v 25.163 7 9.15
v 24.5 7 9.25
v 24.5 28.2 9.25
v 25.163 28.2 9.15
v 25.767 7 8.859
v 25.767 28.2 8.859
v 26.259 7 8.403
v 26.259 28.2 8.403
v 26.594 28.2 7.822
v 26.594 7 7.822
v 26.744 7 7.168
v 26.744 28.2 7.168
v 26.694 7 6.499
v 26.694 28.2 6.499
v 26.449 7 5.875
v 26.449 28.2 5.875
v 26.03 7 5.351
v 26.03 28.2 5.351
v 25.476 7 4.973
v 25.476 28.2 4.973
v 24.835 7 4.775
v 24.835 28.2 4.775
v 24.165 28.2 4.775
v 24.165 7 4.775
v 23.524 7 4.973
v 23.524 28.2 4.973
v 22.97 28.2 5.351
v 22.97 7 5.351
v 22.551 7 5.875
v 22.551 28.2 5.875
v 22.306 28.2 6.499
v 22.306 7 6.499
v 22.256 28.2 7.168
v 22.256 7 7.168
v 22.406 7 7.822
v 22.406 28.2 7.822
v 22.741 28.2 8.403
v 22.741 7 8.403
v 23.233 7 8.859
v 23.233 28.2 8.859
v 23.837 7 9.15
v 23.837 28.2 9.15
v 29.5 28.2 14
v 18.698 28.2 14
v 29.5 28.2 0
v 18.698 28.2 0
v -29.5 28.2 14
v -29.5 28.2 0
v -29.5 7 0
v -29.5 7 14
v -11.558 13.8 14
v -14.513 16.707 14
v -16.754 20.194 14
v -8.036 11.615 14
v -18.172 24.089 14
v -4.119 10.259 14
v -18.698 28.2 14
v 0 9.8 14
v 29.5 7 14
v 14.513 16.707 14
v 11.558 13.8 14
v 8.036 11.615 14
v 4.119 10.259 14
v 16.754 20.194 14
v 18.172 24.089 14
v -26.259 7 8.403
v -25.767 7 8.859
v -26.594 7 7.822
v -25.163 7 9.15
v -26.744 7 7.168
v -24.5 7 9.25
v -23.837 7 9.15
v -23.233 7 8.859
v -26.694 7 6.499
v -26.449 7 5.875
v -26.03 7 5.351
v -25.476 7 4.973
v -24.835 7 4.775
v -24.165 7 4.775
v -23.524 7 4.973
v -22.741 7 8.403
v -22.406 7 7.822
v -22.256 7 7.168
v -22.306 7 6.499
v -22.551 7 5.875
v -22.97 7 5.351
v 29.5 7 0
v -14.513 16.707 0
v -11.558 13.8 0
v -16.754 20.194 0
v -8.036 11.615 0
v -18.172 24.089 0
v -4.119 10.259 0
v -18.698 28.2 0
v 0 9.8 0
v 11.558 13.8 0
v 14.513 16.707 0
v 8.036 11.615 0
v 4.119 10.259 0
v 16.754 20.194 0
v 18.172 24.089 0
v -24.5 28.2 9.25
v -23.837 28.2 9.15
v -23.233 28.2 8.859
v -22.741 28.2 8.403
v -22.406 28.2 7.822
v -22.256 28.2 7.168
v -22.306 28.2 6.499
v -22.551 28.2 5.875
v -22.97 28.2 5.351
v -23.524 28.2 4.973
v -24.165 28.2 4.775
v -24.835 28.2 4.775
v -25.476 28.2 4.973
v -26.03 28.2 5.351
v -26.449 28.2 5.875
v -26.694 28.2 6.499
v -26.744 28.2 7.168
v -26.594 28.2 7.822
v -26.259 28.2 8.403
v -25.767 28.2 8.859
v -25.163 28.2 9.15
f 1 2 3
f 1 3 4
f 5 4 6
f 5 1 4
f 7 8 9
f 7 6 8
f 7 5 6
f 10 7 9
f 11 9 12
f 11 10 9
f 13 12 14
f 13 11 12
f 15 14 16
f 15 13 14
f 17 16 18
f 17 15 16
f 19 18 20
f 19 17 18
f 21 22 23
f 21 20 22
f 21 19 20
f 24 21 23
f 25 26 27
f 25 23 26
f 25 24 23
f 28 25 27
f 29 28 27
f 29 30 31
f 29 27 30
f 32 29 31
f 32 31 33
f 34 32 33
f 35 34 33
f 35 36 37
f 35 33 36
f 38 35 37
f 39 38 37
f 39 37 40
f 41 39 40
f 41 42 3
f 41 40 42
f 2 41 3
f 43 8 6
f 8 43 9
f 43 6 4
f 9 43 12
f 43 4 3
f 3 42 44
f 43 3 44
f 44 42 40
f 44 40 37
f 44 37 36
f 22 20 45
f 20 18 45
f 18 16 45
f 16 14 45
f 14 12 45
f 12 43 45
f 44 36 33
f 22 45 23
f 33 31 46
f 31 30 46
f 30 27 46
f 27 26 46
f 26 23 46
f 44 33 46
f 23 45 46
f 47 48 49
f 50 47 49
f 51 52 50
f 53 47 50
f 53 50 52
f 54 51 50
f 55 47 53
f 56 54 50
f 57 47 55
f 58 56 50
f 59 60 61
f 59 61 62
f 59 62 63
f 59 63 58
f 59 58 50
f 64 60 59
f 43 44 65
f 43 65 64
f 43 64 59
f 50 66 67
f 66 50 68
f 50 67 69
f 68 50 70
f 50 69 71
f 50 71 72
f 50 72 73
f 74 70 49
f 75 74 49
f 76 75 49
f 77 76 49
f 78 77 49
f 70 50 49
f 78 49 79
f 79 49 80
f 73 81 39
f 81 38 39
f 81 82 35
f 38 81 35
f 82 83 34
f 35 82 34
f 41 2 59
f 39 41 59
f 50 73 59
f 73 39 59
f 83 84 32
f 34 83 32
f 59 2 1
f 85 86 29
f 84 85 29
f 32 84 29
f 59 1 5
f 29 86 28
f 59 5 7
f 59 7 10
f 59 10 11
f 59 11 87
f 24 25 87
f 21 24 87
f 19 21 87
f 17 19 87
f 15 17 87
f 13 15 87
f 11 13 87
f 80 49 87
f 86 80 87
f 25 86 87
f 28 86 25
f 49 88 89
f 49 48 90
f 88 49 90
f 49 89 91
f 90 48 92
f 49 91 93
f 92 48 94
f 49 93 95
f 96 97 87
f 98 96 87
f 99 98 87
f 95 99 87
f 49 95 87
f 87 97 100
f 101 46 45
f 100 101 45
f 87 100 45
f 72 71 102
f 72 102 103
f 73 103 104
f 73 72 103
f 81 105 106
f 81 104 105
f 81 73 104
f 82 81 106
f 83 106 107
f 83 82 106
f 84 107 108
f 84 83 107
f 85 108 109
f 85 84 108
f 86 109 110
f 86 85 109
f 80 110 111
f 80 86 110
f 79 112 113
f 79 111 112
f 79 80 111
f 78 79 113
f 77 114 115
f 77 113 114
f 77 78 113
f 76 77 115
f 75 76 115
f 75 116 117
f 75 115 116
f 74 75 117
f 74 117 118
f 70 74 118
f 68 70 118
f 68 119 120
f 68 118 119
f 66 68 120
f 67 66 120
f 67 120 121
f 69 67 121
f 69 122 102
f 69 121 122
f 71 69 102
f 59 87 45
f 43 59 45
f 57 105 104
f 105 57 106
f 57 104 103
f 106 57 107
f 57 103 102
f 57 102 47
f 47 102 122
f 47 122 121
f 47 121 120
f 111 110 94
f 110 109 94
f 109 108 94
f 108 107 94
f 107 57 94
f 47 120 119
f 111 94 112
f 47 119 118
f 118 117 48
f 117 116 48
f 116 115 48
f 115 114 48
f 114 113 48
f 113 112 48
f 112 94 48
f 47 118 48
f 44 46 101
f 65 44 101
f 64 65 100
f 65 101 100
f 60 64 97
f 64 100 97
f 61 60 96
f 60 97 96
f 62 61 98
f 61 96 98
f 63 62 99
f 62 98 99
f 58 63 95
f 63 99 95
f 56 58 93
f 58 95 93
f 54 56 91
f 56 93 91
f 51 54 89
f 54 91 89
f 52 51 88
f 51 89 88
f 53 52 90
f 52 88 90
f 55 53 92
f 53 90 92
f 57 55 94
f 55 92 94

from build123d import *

# Parameters (mm, degrees)
SPLIT_SADDLE_WITH_37_4_MM_BORE_DEPTH = 14
M4_THROUGH_HOLES_DEPTH               = 44.144988121
M4_THROUGH_HOLES_DEPTH_BACK          = 44.144988121
SKETCH2_R                            = 2.25


with BuildPart() as part:
    # Split saddle with 37.4 mm bore profile → Split saddle with 37.4 mm bore (new body)
    with BuildSketch(Plane.XY):
        with BuildLine():
            Line((-29.5, 7), (29.5, 7))
            Line((29.5, 7), (29.5, 28.2))
            Line((29.5, 28.2), (18.697593428, 28.2))
            ThreePointArc((18.697593428, 28.2), (0, 9.8), (-18.697593428, 28.2))
            Line((-18.697593428, 28.2), (-29.5, 28.2))
            Line((-29.5, 28.2), (-29.5, 7))
        make_face()
    extrude(amount=SPLIT_SADDLE_WITH_37_4_MM_BORE_DEPTH)

    # Sketch2 → M4 through holes (cut, two sides: drawn at the far end of the back side and taken through both)
    with BuildSketch(Plane(origin=(0, 0, 0), x_dir=(1, 0, 0), z_dir=(0, 1, 0)).offset(-M4_THROUGH_HOLES_DEPTH_BACK)):
        with Locations(Location((-24.5, -7, 0), (0, 0, 270))):
            Circle(SKETCH2_R)
        with Locations(Location((24.5, -7, 0), (0, 0, 270))):
            Circle(SKETCH2_R)
    extrude(amount=M4_THROUGH_HOLES_DEPTH + M4_THROUGH_HOLES_DEPTH_BACK, mode=Mode.SUBTRACT)


solid = part.part
